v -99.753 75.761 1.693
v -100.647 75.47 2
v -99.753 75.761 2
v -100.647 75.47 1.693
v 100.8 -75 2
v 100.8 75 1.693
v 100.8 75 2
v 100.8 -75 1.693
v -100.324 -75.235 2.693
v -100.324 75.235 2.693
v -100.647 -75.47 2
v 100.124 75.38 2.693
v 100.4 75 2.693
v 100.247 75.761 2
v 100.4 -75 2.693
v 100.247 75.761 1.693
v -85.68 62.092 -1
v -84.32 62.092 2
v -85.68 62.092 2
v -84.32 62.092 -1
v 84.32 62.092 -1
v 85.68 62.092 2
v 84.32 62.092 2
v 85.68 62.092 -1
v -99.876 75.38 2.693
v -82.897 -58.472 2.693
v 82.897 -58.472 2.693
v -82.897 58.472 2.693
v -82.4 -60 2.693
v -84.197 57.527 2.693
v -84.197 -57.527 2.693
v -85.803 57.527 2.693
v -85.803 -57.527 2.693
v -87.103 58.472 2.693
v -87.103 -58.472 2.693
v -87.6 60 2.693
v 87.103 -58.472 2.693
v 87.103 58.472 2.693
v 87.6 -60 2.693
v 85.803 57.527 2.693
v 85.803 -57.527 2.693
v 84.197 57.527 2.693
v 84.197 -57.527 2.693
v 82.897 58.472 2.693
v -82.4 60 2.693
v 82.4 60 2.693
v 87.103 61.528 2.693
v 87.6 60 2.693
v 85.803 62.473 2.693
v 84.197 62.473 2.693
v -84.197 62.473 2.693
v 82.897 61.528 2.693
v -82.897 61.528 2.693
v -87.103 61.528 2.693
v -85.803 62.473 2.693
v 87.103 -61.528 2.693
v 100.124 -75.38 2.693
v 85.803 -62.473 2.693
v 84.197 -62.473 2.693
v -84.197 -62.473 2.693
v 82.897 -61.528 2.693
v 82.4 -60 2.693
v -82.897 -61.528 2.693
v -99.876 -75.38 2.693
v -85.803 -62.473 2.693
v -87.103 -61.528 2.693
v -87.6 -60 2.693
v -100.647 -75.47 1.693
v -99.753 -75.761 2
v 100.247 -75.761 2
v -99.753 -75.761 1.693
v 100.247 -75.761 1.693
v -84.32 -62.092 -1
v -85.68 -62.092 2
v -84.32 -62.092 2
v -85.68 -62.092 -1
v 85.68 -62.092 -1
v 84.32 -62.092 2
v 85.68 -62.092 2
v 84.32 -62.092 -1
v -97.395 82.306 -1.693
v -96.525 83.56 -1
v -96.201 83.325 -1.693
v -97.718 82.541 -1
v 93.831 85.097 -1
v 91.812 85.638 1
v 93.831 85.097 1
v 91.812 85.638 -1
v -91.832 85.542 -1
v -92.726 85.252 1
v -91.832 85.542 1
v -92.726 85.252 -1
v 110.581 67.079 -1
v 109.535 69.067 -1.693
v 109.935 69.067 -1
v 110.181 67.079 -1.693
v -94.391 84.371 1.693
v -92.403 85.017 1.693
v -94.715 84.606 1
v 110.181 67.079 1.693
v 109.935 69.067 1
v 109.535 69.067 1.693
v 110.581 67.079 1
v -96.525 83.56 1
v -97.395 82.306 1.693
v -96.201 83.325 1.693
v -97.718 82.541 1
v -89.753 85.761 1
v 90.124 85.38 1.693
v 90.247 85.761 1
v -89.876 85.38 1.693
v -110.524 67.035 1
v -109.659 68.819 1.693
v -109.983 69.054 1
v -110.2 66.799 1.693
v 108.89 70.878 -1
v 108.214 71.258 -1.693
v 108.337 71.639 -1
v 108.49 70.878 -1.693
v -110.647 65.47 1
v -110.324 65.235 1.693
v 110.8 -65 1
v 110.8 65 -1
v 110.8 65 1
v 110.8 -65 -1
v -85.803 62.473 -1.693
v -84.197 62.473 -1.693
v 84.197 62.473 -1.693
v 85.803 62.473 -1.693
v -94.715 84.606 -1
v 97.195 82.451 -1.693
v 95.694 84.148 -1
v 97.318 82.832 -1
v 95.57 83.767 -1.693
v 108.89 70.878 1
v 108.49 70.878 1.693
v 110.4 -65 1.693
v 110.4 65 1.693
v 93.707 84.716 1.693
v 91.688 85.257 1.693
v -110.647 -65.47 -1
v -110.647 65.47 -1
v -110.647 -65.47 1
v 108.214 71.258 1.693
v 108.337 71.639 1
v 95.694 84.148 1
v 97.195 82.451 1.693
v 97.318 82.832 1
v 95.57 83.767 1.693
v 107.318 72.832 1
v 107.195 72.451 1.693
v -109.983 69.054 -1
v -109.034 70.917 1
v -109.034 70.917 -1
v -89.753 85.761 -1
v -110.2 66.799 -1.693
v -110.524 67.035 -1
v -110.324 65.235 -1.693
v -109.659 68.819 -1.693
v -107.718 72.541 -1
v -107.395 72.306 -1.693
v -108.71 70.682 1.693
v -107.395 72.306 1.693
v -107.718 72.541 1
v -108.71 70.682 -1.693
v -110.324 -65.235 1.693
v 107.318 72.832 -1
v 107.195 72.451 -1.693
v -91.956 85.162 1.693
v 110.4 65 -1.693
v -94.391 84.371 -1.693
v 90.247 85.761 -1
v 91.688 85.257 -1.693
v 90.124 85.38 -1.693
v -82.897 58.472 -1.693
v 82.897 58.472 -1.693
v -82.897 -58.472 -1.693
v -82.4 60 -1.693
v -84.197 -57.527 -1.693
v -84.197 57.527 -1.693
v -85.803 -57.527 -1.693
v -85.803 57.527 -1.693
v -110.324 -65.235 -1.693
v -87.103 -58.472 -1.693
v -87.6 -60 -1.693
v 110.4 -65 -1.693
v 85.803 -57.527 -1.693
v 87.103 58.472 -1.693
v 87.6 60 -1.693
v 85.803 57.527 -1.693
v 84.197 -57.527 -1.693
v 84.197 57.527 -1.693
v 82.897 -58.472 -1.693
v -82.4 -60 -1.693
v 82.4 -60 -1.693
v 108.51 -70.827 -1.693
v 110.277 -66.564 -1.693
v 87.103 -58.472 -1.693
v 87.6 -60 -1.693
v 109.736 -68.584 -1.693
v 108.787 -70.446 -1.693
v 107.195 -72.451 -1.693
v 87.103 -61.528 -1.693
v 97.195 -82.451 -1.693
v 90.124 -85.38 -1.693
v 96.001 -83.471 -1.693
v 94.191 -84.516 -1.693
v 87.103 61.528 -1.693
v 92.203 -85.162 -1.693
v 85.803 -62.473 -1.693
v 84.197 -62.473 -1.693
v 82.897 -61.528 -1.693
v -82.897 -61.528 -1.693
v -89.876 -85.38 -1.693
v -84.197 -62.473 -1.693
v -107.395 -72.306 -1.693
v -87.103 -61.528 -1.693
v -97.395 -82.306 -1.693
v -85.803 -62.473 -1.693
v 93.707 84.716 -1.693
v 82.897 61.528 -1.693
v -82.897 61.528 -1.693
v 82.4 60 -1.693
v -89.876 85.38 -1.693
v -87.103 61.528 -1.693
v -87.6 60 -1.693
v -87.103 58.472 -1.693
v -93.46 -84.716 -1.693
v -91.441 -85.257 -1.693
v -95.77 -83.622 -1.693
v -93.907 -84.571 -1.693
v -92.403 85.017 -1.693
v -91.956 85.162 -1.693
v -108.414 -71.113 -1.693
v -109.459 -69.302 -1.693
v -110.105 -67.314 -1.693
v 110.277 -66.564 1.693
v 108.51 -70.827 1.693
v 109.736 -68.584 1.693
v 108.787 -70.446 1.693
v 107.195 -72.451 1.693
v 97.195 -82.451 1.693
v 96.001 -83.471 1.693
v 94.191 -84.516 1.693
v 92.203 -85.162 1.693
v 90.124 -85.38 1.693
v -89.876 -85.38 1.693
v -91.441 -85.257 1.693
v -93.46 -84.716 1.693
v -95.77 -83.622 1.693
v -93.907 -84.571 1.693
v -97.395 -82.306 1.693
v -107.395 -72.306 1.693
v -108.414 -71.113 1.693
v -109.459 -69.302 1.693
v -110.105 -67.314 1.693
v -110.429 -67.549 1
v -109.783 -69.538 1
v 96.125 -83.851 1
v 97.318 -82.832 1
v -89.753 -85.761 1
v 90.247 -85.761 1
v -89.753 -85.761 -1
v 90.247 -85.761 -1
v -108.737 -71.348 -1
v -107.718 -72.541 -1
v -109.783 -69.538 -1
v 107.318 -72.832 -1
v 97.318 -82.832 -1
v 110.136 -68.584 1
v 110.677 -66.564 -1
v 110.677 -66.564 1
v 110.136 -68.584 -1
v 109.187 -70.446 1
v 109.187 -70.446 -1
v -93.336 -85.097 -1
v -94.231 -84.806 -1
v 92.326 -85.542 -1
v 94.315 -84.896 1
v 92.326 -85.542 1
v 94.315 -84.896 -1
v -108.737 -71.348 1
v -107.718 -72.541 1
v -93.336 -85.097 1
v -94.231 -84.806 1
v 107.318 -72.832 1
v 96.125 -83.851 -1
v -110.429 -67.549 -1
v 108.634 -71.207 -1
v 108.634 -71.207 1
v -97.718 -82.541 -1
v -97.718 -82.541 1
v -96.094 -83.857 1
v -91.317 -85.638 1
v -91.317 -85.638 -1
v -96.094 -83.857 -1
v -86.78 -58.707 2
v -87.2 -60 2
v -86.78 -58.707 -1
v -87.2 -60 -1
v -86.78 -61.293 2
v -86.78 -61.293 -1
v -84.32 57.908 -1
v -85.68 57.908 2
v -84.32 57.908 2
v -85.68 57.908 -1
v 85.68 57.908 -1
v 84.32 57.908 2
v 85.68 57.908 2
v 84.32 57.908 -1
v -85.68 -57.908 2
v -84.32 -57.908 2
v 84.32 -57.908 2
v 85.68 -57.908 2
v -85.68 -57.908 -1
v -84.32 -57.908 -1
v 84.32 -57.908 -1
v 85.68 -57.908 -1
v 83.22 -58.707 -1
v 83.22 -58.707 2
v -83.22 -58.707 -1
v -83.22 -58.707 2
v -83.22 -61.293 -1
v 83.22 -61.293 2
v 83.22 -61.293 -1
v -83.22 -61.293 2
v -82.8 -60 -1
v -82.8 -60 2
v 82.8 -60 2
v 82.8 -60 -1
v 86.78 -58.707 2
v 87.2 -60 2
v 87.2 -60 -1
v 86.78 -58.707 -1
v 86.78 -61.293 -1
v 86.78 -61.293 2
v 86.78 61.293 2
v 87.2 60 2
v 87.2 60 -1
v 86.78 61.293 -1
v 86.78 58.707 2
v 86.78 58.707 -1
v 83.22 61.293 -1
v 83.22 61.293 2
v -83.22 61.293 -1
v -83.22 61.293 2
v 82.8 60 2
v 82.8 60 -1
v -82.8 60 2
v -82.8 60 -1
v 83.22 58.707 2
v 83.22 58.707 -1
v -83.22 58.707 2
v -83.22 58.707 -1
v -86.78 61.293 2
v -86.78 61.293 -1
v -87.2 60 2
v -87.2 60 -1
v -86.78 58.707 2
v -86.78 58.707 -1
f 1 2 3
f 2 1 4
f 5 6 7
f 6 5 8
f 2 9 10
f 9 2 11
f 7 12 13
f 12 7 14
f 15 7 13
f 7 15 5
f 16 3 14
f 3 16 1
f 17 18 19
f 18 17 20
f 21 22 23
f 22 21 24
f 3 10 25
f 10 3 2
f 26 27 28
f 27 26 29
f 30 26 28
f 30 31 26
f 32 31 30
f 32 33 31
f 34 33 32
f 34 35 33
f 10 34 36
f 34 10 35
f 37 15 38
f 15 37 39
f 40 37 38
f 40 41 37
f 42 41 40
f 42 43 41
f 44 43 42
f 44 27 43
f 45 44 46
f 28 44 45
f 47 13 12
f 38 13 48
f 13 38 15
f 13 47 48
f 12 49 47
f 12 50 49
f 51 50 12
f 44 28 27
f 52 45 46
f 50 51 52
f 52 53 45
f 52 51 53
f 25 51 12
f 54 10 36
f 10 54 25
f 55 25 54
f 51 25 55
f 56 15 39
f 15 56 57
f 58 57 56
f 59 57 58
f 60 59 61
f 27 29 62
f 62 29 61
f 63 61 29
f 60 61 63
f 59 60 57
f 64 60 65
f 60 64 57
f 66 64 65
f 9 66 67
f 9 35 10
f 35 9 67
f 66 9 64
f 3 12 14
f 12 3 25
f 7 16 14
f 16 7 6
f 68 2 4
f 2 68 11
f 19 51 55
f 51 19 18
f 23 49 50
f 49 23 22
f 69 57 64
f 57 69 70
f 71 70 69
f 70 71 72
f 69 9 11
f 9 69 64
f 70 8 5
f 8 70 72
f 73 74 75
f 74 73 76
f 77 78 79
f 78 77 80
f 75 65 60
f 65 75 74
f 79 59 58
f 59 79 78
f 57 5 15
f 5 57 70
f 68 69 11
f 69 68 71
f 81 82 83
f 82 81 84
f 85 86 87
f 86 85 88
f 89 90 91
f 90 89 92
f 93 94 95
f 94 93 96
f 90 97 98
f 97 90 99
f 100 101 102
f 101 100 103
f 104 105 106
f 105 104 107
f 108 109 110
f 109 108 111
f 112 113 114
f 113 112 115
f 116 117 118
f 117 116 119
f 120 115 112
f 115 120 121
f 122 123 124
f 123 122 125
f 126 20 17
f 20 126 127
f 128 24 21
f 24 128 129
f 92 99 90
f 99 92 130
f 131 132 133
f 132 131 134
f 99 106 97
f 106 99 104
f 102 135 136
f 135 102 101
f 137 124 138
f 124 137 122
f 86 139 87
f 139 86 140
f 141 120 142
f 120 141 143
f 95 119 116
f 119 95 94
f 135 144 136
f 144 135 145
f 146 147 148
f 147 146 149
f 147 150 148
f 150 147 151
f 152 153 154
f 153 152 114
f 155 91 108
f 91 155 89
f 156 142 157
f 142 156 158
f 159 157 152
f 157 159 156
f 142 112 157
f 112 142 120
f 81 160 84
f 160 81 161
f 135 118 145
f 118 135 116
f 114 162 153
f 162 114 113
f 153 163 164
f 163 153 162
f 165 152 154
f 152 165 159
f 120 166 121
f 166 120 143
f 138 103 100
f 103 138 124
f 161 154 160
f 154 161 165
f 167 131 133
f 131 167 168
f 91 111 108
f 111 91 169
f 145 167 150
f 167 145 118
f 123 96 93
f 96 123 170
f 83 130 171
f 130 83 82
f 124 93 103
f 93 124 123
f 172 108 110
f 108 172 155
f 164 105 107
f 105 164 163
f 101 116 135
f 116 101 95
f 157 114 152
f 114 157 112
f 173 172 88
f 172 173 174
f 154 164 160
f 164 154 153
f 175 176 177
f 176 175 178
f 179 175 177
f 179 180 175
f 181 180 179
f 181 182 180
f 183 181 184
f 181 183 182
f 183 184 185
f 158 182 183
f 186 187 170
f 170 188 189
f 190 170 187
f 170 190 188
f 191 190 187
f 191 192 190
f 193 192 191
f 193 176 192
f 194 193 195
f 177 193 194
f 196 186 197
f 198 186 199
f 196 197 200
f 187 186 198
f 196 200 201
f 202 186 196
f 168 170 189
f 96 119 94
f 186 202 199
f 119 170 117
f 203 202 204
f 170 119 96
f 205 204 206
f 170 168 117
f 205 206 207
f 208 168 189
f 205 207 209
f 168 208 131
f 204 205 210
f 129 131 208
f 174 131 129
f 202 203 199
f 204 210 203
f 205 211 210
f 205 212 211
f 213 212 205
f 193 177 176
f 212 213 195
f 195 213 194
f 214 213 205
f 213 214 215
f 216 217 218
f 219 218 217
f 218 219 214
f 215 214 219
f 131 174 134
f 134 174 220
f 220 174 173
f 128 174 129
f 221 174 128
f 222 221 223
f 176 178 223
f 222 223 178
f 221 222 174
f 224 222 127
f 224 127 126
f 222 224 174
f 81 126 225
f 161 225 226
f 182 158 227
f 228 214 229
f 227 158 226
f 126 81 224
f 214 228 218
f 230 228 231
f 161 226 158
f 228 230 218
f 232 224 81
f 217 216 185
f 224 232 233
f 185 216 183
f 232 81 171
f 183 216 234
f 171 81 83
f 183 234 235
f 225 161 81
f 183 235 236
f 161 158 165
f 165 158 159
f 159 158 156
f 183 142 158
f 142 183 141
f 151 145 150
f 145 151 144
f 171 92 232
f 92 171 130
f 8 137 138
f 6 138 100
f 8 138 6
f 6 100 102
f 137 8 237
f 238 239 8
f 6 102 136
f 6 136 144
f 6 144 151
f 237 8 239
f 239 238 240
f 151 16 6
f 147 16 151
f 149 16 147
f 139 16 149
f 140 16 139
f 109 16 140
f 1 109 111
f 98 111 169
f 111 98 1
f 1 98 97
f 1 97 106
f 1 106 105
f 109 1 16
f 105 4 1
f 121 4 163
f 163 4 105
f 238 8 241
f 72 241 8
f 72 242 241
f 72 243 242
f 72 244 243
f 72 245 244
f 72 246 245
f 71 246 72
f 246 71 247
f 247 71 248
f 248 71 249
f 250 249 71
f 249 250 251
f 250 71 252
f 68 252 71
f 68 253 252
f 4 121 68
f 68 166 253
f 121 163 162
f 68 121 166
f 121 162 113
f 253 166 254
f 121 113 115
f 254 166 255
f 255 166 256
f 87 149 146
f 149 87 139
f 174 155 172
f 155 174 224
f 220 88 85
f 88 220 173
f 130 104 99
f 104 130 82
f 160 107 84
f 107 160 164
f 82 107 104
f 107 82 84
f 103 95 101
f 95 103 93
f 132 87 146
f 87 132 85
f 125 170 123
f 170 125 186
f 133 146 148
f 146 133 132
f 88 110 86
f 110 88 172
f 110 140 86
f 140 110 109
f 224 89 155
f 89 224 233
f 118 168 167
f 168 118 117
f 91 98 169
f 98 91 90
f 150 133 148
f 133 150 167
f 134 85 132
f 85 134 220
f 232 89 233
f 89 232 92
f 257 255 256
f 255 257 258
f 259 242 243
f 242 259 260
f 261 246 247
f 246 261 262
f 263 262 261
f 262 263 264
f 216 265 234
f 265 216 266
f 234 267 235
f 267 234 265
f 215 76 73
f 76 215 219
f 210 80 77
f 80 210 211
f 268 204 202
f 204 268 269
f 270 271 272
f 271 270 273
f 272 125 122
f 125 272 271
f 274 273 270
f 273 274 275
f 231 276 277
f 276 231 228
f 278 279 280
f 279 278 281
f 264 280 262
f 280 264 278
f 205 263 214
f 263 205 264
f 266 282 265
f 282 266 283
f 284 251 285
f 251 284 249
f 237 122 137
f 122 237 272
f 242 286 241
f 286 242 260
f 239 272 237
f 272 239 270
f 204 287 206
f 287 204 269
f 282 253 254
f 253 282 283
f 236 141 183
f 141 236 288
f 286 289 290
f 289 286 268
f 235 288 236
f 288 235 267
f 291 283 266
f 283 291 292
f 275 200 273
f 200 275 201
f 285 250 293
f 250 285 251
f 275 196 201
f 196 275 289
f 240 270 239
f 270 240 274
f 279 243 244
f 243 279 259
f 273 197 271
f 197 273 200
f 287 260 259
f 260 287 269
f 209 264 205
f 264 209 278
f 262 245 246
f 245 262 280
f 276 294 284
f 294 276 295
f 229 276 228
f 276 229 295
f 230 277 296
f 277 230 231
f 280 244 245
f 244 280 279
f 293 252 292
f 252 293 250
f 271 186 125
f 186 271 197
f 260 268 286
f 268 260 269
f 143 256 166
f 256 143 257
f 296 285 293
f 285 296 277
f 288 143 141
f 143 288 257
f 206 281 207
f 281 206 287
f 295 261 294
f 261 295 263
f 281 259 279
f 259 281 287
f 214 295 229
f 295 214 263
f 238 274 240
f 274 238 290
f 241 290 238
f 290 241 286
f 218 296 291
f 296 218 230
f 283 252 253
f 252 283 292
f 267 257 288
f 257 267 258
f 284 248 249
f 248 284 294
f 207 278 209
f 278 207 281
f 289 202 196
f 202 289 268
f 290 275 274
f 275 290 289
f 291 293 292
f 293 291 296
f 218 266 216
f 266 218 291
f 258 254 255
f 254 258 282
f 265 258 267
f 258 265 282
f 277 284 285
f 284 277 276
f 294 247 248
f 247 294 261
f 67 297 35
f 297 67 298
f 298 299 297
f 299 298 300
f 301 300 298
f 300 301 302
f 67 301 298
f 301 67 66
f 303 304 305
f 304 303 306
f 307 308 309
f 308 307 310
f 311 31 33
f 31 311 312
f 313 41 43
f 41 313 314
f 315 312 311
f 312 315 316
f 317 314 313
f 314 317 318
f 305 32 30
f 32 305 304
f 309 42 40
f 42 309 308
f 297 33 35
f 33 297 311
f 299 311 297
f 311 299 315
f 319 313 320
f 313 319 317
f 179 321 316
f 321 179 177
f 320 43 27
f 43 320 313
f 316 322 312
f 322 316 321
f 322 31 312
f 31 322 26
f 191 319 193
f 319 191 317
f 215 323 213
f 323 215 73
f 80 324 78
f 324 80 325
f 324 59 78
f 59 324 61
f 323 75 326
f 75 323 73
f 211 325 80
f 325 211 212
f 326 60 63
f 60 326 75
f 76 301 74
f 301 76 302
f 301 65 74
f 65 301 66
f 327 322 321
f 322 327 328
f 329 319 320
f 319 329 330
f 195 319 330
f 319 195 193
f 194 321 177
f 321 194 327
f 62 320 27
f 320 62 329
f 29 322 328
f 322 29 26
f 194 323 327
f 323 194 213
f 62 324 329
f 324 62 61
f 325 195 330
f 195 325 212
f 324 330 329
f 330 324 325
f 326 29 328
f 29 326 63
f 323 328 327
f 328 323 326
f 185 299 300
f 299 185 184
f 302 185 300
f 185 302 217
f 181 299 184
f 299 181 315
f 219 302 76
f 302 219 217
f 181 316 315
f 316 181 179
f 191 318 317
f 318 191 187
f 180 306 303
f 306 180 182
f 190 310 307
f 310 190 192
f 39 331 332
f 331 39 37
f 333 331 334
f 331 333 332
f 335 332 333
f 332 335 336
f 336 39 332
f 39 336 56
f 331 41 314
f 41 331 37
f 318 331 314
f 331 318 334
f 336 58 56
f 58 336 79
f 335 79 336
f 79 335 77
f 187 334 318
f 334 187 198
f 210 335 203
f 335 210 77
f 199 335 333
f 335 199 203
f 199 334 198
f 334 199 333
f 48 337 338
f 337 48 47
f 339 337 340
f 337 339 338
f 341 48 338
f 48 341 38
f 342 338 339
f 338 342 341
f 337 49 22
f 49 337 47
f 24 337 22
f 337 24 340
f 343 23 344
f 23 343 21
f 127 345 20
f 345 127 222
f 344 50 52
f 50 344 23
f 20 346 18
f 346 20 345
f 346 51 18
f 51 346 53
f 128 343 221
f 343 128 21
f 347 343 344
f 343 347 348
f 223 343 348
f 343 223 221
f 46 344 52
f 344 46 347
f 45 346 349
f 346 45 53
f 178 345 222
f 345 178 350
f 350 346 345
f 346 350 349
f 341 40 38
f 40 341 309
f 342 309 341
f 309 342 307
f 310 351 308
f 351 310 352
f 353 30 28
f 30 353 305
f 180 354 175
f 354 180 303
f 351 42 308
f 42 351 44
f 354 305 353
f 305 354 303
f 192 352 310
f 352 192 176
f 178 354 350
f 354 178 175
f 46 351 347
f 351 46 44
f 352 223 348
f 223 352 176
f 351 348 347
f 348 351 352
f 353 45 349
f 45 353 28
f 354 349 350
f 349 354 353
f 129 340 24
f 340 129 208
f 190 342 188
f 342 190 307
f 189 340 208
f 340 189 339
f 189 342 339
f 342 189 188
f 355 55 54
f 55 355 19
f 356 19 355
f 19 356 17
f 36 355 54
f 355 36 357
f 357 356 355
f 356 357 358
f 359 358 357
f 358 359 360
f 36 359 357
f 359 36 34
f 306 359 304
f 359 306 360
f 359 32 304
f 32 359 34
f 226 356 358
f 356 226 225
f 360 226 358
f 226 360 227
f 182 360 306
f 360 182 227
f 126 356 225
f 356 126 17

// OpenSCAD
// Parameters
sheet_length = 200; //[100:400:1]
sheet_width = 150; //[75:300:1]
sheet_thickness = 2; //[1:6:0.5]
corner_radius = 10; //[5:20:1]
hole_diameter = 6; //[3:12:0.5]
hole_edge_margin = 15; //[8:30:1]
chamfer_size = 0.8; //[0.2:2:0.1]
overlap = 1; //[0.5:2:0.1]

// Base Shapes
module sheet_body() {
  translate([0, 0, sheet_thickness / 2])
    cube([sheet_length, sheet_width, sheet_thickness], center = true);
}

module rounded_corners() {
  linear_extrude(height = sheet_thickness, center = true) {
    offset(r = corner_radius) {
      polygon(points = [
        [-sheet_length / 2 + corner_radius, -sheet_width / 2],
        [sheet_length / 2 - corner_radius, -sheet_width / 2],
        [sheet_length / 2, -sheet_width / 2 + corner_radius],
        [sheet_length / 2, sheet_width / 2 - corner_radius],
        [sheet_length / 2 - corner_radius, sheet_width / 2],
        [-sheet_length / 2 + corner_radius, sheet_width / 2],
        [-sheet_length / 2, sheet_width / 2 - corner_radius],
        [-sheet_length / 2, -sheet_width / 2 + corner_radius]
      ]);
    }
  }
}

module mounting_hole(position) {
  translate(position)
    cylinder(r = hole_diameter / 2, h = sheet_thickness + 2 * overlap, center = true);
}

module chamfer_edges() {
  sphere(r = chamfer_size, center = true);
}

// Operations
module sheet_rounded_union() {
  union() {
    sheet_body();
    rounded_corners();
  }
}

module sheet_with_holes() {
  difference() {
    sheet_rounded_union();
    mounting_hole([-sheet_length / 2 + hole_edge_margin, -sheet_width / 2 + hole_edge_margin, 0]);
    mounting_hole([sheet_length / 2 - hole_edge_margin, -sheet_width / 2 + hole_edge_margin, 0]);
    mounting_hole([sheet_length / 2 - hole_edge_margin, sheet_width / 2 - hole_edge_margin, 0]);
    mounting_hole([-sheet_length / 2 + hole_edge_margin, sheet_width / 2 - hole_edge_margin, 0]);
  }
}

// Final Output
minkowski() {
  sheet_with_holes();
  chamfer_edges();
}
